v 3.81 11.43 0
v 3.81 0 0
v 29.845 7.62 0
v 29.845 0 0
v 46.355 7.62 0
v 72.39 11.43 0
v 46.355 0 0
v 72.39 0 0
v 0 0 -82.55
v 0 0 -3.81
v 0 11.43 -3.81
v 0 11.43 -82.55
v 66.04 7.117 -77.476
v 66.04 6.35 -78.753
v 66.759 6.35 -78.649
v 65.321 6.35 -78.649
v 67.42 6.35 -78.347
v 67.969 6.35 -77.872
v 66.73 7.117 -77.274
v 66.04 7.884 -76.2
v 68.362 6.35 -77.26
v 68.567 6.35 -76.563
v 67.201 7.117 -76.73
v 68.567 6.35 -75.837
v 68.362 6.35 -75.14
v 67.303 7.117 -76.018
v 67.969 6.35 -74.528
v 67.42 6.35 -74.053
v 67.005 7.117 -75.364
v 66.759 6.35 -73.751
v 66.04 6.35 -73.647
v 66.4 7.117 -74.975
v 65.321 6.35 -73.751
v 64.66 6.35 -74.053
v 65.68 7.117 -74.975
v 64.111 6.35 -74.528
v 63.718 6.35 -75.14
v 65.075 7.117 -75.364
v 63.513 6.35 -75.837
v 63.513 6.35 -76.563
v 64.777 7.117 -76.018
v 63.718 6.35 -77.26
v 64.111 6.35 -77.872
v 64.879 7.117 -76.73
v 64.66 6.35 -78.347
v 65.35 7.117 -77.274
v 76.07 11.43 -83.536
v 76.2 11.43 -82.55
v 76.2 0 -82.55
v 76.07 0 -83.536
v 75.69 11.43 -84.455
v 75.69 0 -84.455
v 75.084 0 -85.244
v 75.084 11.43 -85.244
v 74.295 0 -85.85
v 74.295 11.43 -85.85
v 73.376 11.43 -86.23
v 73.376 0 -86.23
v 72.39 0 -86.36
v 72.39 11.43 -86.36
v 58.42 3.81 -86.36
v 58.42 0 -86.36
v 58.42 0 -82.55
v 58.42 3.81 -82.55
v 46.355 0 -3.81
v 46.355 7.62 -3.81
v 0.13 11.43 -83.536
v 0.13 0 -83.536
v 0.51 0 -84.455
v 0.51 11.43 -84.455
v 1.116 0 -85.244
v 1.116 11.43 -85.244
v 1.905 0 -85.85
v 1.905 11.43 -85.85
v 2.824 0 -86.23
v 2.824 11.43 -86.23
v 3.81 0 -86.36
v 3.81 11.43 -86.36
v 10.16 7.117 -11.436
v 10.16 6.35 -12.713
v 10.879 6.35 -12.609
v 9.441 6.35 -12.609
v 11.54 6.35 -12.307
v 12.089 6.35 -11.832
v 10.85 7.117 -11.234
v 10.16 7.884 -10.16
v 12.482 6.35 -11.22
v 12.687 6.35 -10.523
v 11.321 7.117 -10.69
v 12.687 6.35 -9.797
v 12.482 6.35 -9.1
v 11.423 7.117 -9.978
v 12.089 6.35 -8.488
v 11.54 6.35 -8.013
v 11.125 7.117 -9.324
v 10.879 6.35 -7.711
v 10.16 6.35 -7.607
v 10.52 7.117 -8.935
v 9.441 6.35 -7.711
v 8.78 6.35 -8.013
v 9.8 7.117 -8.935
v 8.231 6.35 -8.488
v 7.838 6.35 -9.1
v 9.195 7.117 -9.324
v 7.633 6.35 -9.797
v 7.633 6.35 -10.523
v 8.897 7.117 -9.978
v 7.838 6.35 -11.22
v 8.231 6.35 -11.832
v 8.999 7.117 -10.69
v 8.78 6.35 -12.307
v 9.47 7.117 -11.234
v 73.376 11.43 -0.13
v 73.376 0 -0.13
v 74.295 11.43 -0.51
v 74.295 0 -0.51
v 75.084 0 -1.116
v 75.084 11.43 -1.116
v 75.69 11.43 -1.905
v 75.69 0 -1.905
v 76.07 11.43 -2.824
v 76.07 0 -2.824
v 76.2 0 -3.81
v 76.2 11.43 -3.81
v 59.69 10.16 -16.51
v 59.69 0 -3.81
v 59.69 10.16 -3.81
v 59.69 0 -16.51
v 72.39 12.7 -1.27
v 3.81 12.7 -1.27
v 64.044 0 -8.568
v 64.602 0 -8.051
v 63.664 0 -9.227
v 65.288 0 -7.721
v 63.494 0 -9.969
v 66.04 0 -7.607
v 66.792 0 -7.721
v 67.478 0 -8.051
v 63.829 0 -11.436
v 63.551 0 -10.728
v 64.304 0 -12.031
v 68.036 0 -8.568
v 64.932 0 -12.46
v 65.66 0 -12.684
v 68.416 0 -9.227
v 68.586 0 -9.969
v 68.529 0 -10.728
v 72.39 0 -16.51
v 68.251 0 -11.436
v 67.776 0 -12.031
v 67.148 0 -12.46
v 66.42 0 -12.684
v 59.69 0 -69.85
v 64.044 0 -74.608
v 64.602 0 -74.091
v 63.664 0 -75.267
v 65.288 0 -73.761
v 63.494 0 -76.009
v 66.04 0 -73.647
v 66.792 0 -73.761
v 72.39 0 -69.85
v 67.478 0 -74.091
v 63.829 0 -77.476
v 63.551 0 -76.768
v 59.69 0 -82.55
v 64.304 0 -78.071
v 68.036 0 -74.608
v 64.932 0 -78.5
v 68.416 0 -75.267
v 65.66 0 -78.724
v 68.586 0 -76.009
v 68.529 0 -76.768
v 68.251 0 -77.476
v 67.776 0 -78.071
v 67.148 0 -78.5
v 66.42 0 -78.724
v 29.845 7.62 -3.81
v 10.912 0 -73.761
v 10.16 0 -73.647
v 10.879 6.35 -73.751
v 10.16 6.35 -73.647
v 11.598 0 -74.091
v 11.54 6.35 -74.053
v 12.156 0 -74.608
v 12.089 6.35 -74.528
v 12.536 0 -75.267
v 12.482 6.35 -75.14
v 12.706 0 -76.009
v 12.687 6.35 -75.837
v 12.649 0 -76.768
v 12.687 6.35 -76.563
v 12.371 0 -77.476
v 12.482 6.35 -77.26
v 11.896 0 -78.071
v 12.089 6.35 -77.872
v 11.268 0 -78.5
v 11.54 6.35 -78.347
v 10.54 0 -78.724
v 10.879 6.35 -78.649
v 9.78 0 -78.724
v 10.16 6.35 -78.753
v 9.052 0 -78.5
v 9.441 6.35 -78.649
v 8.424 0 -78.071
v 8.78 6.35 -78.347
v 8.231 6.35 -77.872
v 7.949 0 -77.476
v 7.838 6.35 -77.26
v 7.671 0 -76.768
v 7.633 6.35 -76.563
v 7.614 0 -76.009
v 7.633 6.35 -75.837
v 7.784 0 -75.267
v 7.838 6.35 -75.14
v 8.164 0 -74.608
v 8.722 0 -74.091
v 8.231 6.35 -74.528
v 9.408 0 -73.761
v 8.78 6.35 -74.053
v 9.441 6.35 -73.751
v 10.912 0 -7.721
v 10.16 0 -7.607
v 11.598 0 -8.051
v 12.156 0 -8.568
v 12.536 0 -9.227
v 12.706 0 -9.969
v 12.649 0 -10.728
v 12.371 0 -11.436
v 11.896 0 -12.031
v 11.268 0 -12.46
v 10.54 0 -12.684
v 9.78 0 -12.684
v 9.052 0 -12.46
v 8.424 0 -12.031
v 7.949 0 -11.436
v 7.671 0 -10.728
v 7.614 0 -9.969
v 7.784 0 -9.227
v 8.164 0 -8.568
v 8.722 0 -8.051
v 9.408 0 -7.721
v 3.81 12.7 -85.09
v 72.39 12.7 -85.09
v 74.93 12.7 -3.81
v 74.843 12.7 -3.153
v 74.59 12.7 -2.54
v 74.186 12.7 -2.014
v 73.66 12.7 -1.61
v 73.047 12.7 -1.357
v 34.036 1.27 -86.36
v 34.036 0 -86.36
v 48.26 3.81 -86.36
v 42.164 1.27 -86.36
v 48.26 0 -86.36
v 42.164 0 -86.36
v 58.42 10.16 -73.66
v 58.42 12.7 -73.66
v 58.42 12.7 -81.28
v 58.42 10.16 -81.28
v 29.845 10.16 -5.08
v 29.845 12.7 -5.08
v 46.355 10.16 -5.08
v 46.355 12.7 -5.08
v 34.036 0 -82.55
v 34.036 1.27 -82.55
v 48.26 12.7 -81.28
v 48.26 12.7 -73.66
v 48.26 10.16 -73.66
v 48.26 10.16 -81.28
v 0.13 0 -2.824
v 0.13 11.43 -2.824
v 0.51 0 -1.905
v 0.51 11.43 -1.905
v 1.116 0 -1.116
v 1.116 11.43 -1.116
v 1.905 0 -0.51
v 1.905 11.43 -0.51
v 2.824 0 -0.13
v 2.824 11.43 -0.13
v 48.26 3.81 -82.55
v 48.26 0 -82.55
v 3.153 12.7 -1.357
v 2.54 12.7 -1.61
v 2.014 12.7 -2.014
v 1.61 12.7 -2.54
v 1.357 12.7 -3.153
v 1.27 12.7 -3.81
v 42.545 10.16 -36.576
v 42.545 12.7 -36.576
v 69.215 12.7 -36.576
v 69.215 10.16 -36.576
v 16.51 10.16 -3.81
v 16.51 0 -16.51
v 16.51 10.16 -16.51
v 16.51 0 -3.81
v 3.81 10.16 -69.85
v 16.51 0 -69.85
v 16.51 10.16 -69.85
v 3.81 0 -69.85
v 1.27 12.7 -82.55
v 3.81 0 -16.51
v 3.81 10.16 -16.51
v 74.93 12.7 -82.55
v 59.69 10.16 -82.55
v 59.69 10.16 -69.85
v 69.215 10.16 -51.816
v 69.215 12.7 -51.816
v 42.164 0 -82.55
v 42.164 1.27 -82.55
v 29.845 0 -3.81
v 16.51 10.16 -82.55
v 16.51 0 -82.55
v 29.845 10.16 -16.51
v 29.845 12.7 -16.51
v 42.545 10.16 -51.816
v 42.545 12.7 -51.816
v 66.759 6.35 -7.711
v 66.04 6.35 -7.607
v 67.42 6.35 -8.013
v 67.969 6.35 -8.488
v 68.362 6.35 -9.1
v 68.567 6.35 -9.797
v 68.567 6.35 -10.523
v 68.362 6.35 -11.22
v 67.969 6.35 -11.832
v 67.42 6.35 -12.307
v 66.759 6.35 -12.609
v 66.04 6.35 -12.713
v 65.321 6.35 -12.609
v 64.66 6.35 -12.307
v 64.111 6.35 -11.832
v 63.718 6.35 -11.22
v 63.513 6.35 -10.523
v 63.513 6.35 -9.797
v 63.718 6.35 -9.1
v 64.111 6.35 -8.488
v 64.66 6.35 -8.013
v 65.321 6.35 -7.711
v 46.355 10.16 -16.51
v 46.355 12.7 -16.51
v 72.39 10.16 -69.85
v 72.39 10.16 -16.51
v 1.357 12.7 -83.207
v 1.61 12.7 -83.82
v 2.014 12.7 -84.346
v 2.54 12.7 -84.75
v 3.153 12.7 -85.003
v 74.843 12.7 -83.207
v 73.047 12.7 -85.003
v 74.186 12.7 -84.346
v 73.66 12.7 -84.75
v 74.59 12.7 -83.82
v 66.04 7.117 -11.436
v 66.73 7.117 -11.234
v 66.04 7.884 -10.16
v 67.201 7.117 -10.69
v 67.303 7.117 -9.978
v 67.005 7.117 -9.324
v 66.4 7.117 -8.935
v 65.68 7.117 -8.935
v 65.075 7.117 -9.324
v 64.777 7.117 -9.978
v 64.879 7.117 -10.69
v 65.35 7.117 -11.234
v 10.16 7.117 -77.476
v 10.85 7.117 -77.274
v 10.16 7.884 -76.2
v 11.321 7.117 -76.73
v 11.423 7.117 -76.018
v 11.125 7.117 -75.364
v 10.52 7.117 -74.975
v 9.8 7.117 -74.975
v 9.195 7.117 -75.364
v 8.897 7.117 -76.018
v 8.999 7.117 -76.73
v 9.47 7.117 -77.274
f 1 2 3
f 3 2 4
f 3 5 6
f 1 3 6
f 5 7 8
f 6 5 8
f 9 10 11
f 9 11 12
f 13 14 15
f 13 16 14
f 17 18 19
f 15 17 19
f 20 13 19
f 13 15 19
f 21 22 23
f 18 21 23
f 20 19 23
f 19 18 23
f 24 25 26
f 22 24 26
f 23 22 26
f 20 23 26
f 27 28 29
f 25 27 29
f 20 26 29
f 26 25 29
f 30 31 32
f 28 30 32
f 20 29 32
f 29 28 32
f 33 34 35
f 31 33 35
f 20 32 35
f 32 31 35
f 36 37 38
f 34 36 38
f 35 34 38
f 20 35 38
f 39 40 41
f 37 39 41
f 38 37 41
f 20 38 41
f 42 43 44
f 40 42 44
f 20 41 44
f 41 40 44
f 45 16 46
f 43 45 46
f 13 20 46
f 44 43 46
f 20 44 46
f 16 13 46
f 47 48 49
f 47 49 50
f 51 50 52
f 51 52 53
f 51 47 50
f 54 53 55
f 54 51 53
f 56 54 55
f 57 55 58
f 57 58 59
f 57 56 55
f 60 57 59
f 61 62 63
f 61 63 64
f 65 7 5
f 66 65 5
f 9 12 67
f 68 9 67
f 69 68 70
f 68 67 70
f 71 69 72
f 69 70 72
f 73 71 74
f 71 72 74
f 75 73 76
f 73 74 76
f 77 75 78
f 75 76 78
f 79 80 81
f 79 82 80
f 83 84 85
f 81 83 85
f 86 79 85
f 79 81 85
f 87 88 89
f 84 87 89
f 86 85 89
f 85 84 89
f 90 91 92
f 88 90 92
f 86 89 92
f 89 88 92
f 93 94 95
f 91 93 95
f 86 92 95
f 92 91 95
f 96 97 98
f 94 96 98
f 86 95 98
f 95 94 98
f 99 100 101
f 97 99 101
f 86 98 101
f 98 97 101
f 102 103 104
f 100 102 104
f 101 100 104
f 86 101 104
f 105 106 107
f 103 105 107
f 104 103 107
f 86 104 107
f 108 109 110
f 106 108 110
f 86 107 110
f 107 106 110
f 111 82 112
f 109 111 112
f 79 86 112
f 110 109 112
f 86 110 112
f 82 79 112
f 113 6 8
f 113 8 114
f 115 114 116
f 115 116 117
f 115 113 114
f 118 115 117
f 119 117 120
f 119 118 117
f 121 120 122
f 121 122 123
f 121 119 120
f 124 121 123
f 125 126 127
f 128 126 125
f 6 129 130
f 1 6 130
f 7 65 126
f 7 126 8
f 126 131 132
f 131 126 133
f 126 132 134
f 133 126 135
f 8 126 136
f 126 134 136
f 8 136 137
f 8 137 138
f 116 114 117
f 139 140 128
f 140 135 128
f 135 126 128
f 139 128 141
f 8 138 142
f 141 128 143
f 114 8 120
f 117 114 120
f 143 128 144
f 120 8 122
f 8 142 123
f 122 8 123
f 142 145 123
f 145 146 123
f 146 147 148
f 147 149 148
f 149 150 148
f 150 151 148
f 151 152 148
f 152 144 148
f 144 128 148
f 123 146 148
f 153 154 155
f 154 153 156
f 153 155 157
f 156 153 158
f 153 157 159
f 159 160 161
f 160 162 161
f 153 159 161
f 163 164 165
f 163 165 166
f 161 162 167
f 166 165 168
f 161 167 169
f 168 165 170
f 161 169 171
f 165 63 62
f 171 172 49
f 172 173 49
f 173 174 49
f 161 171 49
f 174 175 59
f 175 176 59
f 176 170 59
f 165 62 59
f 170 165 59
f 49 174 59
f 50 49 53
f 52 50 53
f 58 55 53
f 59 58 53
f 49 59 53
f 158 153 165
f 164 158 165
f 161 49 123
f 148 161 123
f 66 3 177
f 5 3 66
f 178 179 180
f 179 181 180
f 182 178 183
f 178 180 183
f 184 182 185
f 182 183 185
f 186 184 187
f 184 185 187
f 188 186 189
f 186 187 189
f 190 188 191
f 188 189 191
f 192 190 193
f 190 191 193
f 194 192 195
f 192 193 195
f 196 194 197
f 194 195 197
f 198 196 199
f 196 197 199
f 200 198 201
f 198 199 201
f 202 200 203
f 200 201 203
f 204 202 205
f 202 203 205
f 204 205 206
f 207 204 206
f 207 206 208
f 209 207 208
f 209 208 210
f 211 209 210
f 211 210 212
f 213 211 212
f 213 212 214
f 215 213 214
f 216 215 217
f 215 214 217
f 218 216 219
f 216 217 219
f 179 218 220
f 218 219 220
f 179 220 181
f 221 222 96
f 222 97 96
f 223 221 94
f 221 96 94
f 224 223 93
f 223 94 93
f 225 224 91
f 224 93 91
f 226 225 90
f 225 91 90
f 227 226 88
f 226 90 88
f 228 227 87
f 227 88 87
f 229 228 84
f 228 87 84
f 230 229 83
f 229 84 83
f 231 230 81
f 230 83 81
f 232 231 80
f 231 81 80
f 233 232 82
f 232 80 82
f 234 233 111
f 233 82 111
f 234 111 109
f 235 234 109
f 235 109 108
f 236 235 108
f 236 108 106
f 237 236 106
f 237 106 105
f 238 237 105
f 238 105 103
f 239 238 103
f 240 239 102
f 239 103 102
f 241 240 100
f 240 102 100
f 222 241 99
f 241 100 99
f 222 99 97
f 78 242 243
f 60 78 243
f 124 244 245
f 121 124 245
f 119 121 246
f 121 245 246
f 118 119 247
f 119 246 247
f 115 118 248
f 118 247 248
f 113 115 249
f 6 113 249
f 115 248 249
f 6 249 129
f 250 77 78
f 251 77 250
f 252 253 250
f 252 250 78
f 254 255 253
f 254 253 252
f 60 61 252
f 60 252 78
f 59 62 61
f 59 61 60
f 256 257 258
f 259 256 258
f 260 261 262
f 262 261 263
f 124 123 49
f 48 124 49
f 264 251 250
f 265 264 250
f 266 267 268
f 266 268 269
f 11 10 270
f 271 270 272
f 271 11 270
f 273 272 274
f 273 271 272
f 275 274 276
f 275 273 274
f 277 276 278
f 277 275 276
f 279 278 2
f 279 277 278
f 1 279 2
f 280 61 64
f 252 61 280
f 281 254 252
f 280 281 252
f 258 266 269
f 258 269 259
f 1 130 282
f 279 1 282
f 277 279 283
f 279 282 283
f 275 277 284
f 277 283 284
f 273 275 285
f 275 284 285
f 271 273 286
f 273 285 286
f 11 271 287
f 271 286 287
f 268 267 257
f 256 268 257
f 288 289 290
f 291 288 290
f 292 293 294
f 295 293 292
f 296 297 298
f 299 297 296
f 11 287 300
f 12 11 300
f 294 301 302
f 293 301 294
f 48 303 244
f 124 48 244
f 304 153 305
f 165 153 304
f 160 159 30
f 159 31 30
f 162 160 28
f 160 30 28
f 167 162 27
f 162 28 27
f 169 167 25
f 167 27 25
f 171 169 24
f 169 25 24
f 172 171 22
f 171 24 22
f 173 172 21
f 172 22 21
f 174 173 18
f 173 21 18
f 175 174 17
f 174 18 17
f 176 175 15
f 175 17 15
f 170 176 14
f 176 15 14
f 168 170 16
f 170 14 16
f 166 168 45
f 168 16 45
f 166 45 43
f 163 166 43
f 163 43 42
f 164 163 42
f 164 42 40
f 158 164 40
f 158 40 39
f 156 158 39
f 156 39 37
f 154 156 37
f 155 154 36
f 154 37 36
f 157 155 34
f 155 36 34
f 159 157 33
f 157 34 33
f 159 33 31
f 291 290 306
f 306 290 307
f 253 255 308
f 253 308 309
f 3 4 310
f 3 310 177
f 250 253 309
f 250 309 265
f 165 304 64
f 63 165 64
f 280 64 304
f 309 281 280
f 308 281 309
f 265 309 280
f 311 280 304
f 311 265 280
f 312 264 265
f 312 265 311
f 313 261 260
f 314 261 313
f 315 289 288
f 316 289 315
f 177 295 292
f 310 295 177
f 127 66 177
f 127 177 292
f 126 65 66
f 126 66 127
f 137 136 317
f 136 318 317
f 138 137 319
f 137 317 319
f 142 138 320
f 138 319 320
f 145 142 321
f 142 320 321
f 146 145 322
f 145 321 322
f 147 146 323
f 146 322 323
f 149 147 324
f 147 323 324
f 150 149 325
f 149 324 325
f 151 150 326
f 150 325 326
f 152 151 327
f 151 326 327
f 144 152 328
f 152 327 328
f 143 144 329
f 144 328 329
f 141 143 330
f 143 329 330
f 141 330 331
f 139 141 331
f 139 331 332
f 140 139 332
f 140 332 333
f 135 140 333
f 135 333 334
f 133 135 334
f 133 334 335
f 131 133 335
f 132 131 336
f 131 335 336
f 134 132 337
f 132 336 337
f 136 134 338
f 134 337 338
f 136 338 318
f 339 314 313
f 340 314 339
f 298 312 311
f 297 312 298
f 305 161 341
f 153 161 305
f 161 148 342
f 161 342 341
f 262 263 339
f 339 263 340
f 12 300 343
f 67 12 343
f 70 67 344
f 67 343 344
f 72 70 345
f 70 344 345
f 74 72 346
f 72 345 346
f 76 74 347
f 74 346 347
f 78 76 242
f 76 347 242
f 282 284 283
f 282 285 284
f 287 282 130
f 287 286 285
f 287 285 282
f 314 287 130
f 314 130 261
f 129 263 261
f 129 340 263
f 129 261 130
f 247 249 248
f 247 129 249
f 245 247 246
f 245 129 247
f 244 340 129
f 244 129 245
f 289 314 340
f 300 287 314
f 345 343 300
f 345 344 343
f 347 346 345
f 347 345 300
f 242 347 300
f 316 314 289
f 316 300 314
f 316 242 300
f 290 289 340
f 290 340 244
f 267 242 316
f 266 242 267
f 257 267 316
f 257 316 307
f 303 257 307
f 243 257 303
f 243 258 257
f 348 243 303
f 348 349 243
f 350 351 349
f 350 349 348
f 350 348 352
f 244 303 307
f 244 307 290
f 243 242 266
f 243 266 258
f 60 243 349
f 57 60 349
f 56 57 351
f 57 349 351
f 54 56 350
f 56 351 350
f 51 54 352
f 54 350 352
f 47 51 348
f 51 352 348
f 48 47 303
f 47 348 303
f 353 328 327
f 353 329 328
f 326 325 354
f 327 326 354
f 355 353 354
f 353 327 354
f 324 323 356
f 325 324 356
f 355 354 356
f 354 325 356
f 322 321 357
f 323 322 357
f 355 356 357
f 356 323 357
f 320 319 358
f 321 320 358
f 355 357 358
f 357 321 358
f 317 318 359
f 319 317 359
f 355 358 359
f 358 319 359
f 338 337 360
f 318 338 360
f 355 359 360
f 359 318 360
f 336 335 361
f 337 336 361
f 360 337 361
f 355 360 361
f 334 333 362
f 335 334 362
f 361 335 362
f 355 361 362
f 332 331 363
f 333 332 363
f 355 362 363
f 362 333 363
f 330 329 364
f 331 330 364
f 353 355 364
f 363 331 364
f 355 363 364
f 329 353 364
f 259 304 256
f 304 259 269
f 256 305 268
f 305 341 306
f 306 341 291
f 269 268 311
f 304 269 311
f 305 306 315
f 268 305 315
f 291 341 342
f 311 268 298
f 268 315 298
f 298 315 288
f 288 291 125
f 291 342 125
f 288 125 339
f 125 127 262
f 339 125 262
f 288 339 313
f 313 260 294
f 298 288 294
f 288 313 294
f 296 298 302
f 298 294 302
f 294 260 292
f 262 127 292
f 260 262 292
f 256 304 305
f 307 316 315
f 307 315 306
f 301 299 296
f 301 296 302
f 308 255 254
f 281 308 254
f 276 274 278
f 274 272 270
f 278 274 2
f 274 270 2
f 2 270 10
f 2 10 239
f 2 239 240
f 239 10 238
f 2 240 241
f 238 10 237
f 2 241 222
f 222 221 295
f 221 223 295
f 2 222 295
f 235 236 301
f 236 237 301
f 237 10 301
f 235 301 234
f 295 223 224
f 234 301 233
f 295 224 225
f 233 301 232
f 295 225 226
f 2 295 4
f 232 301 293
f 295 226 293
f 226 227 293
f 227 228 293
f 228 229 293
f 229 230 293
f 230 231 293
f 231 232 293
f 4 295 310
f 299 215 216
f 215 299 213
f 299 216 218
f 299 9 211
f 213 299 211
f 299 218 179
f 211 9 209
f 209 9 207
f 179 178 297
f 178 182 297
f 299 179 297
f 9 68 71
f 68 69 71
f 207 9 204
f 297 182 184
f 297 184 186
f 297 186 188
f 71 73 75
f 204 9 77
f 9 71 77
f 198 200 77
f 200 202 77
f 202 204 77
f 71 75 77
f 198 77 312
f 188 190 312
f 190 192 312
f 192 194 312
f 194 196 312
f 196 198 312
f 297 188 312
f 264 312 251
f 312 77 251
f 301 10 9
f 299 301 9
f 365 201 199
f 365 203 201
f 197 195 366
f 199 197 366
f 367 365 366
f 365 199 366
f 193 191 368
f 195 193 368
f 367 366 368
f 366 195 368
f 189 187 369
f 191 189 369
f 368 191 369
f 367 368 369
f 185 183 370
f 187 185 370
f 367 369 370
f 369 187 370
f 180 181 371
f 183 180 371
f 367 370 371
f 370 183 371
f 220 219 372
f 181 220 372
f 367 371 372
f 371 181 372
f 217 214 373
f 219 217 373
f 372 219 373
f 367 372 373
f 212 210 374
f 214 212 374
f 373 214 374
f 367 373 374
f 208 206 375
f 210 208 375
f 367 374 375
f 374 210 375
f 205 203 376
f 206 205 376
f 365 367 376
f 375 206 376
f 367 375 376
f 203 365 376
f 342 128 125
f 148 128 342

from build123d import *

# Parameters (mm, degrees)
SKETCH1_W                   = 76.2
SKETCH1_H                   = 86.36
BOSS_EXTRUDE1_DEPTH         = 12.7
FILLET1_R                   = 3.81
CHAMFER1_SIZE               = 1.27
CUT_EXTRUDE1_DEPTH          = 10.16
SKETCH5_W                   = 16.51
SKETCH5_H                   = 11.43
CUT_EXTRUDE2_DEPTH          = 2.54
CUT_EXTRUDE3_REACH          = 117.87
SKETCH6_W                   = 16.51
SKETCH6_H                   = 7.62
CUT_EXTRUDE4_REACH          = 117.87
SKETCH8_W                   = 8.128
SKETCH8_H                   = 1.27
CUT_EXTRUDE5_REACH          = 117.87
SKETCH9_W                   = 10.16
SKETCH9_H                   = 3.81
CUT_EXTRUDE6_REACH          = 117.87
SKETCH10_W                  = 10.16
SKETCH10_H                  = 7.62
CUT_EXTRUDE7_REACH          = 117.87
SKETCH11_W                  = 26.67
SKETCH11_H                  = 15.24
F_1_4_20_TAPPED_HOLE1_D     = 5.1054
F_1_4_20_TAPPED_HOLE1_DEPTH = 6.35
F_1_4_20_TAPPED_HOLE1_TIP   = 1.533816902


with BuildPart() as part:
    # Sketch1 → Boss-Extrude1 (new body)
    with BuildSketch(Plane(origin=(0, 0, 0), x_dir=(1, 0, 0), z_dir=(0, 1, 0))):
        with Locations((38.1, 43.18)):
            Rectangle(SKETCH1_W, SKETCH1_H)
    extrude(amount=BOSS_EXTRUDE1_DEPTH)

    # Fillet1
    fillet1_edges = [part.edges().sort_by_distance(p)[0] for p in [
        (0, 6.35, -86.36),
        (76.2, 6.35, -86.36),
        (76.2, 6.35, 0),
        (0, 6.35, 0),
    ]]
    fillet(fillet1_edges, radius=FILLET1_R)

    # Chamfer1
    chamfer1_edges = [part.edges().sort_by_distance(p)[0] for p in [
        (0, 12.7, -43.18),
        (38.1, 12.7, -86.36),
        (38.1, 12.7, 0),
        (76.2, 12.7, -43.18),
        (1.115923164, 12.7, -1.115923164),
        (75.084076836, 12.7, -1.115923164),
        (75.084076836, 12.7, -85.244076836),
        (1.115923164, 12.7, -85.244076836),
    ]]
    chamfer(chamfer1_edges, length=CHAMFER1_SIZE)

    # Sketch4 → Cut-Extrude1 (cut)
    with BuildSketch(Plane.XZ):
        Polygon((3.81, -16.51), (16.51, -16.51), (16.51, -3.81), (59.69, -3.81), (59.69, -16.51), (72.39, -16.51), (72.39, -69.85), (59.69, -69.85), (59.69, -82.55), (16.51, -82.55), (16.51, -69.85), (3.81, -69.85), align=None)
    extrude(amount=-CUT_EXTRUDE1_DEPTH, mode=Mode.SUBTRACT)

    # Sketch5 → Cut-Extrude2 (cut)
    with BuildSketch(Plane(origin=(0, 12.7, 0), x_dir=(1, 0, 0), z_dir=(0, 1, 0))):
        with Locations((38.1, 10.795)):
            Rectangle(SKETCH5_W, SKETCH5_H)
    extrude(amount=-CUT_EXTRUDE2_DEPTH, mode=Mode.SUBTRACT)

    # Sketch6 → Cut-Extrude3 (cut, up to next)
    with BuildSketch(Plane.XY, mode=Mode.PRIVATE) as cut_extrude3_sk1:
        with Locations((38.1, 3.81)):
            Rectangle(SKETCH6_W, SKETCH6_H)
    cut_extrude3_tool1 = extrude(cut_extrude3_sk1.sketch, amount=-CUT_EXTRUDE3_REACH, mode=Mode.PRIVATE) & part.part
    add(cut_extrude3_tool1.solids().sort_by_distance((38.1, 3.81, 0))[0], mode=Mode.SUBTRACT)

    # Sketch8 → Cut-Extrude4 (cut, up to next)
    with BuildSketch(Plane(origin=(0, 0, -86.36), x_dir=(-1, 0, 0), z_dir=(0, 0, -1)), mode=Mode.PRIVATE) as cut_extrude4_sk1:
        with Locations((-38.1, 0.635)):
            Rectangle(SKETCH8_W, SKETCH8_H)
    cut_extrude4_tool1 = extrude(cut_extrude4_sk1.sketch, amount=-CUT_EXTRUDE4_REACH, mode=Mode.PRIVATE) & part.part
    add(cut_extrude4_tool1.solids().sort_by_distance((38.1, 0.635, -86.36))[0], mode=Mode.SUBTRACT)

    # Sketch9 → Cut-Extrude5 (cut, up to next)
    with BuildSketch(Plane(origin=(0, 0, -86.36), x_dir=(-1, 0, 0), z_dir=(0, 0, -1)), mode=Mode.PRIVATE) as cut_extrude5_sk1:
        with Locations((-53.34, 1.905)):
            Rectangle(SKETCH9_W, SKETCH9_H)
    cut_extrude5_tool1 = extrude(cut_extrude5_sk1.sketch, amount=-CUT_EXTRUDE5_REACH, mode=Mode.PRIVATE) & part.part
    add(cut_extrude5_tool1.solids().sort_by_distance((53.34, 1.905, -86.36))[0], mode=Mode.SUBTRACT)

    # Sketch10 → Cut-Extrude6 (cut, up to next)
    with BuildSketch(Plane(origin=(0, 12.7, 0), x_dir=(1, 0, 0), z_dir=(0, 1, 0)), mode=Mode.PRIVATE) as cut_extrude6_sk1:
        with Locations((53.34, 77.47)):
            Rectangle(SKETCH10_W, SKETCH10_H)
    cut_extrude6_tool1 = extrude(cut_extrude6_sk1.sketch, amount=-CUT_EXTRUDE6_REACH, mode=Mode.PRIVATE) & part.part
    add(cut_extrude6_tool1.solids().sort_by_distance((53.34, 12.7, -77.47))[0], mode=Mode.SUBTRACT)

    # Sketch11 → Cut-Extrude7 (cut, up to next)
    with BuildSketch(Plane(origin=(0, 12.7, 0), x_dir=(1, 0, 0), z_dir=(0, 1, 0)), mode=Mode.PRIVATE) as cut_extrude7_sk1:
        with Locations((55.88, 44.196)):
            Rectangle(SKETCH11_W, SKETCH11_H)
    cut_extrude7_tool1 = extrude(cut_extrude7_sk1.sketch, amount=-CUT_EXTRUDE7_REACH, mode=Mode.PRIVATE) & part.part
    add(cut_extrude7_tool1.solids().sort_by_distance((55.88, 12.7, -44.196))[0], mode=Mode.SUBTRACT)

    # 1/4-20 Tapped Hole1
    with Locations(Plane(origin=(10.16, 0, -10.16), x_dir=(0, 0, -1), z_dir=(0, -1, 0))):
        with Locations((0, 0), (66.04, 0), (66.04, 55.88), (0, 55.88)):
            Hole(F_1_4_20_TAPPED_HOLE1_D / 2, depth=F_1_4_20_TAPPED_HOLE1_DEPTH)
            with Locations((0, 0, -(F_1_4_20_TAPPED_HOLE1_DEPTH + F_1_4_20_TAPPED_HOLE1_TIP / 2))):  # 118° drill point
                Cone(0, F_1_4_20_TAPPED_HOLE1_D / 2, F_1_4_20_TAPPED_HOLE1_TIP, mode=Mode.SUBTRACT)


solid = part.part
